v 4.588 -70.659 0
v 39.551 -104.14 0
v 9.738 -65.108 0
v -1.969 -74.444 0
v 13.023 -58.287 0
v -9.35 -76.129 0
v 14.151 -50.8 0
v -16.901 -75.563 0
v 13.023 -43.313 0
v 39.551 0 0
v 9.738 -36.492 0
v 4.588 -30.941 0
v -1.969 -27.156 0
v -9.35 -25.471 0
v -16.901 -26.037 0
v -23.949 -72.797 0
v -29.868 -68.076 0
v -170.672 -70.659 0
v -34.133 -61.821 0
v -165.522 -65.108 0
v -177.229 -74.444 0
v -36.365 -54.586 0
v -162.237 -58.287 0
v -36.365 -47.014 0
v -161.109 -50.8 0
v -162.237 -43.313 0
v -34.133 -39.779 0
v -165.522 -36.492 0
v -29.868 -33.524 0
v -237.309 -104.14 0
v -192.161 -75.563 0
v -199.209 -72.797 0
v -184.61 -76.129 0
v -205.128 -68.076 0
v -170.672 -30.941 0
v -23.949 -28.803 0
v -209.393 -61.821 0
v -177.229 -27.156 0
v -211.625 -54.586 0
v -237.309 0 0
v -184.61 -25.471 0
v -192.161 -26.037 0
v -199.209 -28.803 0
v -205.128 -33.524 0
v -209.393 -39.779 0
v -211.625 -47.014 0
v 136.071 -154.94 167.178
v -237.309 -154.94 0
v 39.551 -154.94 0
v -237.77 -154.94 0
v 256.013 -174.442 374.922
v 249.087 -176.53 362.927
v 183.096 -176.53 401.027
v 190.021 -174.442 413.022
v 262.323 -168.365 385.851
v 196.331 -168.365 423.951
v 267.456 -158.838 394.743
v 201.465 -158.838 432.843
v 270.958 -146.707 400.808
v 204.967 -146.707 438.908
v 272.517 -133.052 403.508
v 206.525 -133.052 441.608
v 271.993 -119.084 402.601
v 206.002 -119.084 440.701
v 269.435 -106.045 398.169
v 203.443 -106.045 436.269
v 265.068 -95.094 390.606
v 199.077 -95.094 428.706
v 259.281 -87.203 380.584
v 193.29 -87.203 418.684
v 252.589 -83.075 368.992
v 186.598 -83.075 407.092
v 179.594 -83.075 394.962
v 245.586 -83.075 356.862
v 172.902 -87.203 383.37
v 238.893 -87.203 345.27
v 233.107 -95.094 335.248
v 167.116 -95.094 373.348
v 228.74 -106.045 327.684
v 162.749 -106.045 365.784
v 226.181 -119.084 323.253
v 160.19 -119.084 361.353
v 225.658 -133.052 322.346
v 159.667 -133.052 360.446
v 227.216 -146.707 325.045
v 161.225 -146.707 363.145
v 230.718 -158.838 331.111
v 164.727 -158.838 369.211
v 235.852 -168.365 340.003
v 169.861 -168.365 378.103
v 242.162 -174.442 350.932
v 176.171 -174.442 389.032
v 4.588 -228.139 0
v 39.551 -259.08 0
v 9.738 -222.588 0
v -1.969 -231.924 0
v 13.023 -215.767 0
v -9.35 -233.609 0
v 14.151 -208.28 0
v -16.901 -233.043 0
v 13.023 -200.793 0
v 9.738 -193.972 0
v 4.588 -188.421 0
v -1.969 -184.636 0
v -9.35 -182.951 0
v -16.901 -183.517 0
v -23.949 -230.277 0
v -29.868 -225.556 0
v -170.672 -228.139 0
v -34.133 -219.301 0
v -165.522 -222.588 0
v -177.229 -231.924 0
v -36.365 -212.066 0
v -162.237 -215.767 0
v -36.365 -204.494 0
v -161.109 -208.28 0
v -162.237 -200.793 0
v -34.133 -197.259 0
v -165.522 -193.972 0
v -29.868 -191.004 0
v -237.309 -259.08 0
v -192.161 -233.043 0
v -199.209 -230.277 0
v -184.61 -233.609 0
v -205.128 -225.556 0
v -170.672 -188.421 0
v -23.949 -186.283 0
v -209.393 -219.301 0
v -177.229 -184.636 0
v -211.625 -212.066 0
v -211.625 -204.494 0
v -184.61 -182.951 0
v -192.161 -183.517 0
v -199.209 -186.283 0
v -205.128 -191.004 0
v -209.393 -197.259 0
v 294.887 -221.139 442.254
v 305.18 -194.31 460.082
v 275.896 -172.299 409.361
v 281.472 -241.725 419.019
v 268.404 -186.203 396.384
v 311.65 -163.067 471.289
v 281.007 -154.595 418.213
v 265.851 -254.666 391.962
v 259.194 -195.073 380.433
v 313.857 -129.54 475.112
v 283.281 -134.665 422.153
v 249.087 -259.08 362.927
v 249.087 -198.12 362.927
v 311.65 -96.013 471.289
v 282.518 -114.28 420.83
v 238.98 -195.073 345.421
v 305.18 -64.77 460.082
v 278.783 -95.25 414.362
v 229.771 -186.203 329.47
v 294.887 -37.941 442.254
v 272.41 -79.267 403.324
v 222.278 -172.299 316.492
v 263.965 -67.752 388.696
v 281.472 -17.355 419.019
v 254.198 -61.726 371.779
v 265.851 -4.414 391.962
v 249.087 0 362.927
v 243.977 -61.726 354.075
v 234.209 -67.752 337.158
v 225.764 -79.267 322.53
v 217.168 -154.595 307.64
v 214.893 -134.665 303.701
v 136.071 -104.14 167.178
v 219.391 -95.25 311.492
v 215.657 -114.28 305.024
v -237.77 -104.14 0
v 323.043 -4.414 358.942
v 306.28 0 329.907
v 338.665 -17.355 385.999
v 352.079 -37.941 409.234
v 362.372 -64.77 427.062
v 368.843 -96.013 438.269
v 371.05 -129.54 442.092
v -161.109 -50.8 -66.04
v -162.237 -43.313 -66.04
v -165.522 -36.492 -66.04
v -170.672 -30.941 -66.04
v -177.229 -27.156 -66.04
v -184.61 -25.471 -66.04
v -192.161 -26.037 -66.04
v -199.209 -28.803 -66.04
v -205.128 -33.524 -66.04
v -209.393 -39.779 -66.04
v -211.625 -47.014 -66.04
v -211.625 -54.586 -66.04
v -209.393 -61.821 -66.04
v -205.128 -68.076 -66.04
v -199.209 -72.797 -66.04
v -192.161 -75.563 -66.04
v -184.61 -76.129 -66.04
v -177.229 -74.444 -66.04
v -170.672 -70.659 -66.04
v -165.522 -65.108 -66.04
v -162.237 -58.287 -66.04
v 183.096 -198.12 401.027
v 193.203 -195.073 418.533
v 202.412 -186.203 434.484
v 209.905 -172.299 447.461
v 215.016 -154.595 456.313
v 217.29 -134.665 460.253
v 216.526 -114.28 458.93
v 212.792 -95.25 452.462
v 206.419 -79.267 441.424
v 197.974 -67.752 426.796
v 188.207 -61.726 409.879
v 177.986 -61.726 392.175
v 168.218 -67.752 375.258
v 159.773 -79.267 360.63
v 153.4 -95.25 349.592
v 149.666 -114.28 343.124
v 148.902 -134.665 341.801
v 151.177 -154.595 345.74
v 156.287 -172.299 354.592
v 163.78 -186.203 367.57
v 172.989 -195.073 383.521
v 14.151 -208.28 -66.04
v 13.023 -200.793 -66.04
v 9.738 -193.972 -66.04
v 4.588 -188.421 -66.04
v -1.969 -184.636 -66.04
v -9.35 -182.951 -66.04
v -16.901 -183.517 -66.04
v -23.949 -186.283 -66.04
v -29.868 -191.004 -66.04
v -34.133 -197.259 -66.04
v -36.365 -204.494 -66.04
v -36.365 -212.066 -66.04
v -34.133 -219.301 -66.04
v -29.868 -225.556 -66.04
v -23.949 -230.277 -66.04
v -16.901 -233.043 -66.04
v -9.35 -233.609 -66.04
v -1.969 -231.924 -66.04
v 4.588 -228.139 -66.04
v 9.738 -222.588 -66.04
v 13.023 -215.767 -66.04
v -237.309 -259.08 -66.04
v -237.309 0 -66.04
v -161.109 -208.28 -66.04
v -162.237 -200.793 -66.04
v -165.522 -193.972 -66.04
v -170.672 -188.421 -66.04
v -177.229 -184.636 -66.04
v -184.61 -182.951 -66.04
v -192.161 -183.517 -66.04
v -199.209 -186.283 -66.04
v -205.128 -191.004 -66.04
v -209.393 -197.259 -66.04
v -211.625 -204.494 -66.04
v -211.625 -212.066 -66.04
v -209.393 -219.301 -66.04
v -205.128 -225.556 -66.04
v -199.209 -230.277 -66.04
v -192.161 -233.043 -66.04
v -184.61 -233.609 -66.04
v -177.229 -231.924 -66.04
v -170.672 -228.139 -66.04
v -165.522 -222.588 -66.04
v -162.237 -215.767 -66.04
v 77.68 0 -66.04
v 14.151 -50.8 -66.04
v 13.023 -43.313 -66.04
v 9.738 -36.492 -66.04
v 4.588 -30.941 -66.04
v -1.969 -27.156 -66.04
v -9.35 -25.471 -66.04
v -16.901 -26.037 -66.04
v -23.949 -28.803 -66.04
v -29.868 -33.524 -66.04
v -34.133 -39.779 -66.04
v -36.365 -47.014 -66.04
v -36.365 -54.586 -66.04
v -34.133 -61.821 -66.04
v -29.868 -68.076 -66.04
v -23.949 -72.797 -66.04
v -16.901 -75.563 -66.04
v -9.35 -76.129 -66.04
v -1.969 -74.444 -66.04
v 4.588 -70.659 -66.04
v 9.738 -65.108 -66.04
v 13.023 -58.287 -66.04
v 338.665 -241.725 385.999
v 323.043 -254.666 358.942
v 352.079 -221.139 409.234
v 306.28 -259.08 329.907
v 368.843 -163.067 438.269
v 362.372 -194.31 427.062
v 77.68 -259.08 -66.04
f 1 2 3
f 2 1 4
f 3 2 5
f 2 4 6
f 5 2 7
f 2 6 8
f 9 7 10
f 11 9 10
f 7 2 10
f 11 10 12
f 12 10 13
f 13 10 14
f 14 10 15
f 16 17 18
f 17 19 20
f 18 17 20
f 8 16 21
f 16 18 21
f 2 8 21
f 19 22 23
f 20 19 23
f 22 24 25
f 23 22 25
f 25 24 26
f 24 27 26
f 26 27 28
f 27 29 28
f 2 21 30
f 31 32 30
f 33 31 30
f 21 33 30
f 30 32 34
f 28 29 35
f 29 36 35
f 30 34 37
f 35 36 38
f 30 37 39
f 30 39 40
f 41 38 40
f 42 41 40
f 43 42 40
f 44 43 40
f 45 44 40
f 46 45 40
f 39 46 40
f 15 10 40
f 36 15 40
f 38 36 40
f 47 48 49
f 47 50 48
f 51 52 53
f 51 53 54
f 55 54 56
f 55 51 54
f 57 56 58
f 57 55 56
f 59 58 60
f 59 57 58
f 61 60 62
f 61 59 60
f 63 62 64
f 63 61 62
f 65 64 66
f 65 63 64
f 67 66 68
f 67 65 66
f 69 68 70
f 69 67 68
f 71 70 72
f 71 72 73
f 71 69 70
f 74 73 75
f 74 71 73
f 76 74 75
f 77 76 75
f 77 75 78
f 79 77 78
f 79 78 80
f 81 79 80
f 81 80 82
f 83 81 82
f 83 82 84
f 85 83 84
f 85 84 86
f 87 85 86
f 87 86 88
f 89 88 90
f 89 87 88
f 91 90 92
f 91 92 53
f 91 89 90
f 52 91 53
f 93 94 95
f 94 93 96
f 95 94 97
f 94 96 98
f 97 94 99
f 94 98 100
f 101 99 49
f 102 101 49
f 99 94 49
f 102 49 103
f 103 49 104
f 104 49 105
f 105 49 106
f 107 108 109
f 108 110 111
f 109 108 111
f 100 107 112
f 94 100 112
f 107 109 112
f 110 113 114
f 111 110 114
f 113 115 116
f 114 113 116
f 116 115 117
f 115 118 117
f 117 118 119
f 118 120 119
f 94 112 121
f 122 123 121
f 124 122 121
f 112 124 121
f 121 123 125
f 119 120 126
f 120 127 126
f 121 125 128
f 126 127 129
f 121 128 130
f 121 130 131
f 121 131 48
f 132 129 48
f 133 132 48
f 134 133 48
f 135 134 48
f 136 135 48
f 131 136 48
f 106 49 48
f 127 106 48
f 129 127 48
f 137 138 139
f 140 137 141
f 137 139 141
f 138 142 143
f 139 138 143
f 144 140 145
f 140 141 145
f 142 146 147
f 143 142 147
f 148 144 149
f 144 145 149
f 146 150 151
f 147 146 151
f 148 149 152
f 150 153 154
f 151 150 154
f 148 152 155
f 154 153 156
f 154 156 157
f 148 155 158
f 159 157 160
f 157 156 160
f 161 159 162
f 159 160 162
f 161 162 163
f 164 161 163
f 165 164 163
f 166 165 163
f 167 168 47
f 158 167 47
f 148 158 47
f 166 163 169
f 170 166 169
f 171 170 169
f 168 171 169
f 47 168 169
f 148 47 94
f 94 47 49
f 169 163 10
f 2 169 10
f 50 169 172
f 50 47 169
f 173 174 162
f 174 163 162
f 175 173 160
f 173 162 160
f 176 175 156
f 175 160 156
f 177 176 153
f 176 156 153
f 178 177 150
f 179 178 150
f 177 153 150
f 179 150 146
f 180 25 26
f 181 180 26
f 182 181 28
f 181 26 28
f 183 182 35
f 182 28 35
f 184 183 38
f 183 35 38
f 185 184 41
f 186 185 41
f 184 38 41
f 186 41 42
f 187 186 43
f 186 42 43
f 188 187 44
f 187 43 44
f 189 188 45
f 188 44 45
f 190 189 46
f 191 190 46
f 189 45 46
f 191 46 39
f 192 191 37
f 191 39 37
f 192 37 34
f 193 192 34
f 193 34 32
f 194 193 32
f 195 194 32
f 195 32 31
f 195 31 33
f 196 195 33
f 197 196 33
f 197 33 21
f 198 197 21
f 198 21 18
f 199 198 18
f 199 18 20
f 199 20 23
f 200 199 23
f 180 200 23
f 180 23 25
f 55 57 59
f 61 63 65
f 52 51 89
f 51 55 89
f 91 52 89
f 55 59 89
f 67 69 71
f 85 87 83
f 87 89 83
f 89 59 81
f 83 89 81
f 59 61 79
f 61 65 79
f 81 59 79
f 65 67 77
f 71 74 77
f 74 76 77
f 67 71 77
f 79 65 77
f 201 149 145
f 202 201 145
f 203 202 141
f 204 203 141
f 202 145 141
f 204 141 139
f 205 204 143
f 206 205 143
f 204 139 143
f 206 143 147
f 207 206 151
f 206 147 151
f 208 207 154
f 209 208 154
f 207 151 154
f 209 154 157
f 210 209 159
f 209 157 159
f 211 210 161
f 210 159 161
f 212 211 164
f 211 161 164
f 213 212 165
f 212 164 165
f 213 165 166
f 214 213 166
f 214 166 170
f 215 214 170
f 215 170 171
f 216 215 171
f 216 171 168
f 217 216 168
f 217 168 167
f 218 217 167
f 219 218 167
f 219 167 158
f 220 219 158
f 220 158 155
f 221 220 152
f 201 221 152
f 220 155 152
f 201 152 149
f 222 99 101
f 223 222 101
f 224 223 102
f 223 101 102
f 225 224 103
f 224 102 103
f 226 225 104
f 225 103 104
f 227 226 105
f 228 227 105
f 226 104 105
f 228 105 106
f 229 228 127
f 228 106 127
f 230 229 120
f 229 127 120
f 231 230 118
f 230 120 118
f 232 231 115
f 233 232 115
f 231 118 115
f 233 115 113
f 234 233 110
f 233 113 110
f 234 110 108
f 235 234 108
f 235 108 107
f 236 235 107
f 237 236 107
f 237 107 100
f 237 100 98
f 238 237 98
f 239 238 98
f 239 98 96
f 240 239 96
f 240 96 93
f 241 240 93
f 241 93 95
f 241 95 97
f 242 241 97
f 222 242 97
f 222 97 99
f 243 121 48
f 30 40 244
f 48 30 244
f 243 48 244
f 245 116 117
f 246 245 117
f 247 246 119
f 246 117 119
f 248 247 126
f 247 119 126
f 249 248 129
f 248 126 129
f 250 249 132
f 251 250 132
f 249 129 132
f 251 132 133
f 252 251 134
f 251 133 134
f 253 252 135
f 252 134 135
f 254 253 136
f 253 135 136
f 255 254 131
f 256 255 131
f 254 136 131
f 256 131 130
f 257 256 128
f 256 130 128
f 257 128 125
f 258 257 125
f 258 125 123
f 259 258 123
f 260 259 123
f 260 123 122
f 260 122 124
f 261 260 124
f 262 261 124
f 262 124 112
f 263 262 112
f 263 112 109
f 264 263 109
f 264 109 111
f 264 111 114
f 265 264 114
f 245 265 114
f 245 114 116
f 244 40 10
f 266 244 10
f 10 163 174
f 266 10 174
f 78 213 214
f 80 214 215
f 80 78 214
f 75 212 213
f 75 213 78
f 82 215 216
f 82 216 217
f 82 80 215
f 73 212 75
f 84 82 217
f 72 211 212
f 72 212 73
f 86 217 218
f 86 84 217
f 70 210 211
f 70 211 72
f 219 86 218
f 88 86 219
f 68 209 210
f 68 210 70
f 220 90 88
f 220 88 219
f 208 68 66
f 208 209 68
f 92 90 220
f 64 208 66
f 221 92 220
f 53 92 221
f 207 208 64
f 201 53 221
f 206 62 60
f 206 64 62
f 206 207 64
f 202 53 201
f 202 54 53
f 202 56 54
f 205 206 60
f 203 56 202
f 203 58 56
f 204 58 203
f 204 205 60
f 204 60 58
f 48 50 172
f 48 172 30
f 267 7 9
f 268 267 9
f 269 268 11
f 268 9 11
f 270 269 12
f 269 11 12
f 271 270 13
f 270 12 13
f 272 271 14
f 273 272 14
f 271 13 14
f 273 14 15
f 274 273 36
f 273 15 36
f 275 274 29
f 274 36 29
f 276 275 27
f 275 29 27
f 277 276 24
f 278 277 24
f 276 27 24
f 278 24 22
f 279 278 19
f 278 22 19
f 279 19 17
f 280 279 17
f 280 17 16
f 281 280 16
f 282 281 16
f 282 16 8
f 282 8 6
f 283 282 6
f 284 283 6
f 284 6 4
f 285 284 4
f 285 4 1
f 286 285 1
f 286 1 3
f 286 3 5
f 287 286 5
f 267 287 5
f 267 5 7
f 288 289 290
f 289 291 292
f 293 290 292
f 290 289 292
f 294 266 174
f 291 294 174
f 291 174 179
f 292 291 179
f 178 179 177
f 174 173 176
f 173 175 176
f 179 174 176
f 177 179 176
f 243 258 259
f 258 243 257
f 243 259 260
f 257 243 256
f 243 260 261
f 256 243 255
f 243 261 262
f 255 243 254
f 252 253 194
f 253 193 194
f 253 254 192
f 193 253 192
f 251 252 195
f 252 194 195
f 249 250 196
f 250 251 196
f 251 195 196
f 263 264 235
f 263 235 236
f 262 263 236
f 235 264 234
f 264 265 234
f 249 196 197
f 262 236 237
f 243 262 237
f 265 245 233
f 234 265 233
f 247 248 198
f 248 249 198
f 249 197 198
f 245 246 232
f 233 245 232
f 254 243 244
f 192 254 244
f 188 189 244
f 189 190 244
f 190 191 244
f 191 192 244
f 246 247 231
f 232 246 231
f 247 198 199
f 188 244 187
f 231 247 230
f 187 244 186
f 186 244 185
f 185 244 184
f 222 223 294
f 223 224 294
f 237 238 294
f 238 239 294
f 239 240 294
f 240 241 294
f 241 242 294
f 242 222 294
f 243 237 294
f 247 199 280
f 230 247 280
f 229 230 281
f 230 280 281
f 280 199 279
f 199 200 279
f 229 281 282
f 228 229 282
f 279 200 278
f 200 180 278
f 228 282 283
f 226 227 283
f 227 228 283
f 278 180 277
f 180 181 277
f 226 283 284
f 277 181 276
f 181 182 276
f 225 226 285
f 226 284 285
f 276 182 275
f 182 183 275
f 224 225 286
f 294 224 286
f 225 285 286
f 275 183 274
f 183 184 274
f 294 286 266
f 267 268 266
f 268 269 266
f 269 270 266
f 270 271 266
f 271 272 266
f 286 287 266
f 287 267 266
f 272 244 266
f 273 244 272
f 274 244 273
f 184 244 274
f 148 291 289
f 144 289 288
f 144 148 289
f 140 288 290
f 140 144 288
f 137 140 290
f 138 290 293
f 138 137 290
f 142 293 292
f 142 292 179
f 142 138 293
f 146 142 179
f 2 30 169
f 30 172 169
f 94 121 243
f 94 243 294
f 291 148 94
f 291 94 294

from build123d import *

# Parameters (mm, degrees)
F1_DEPTH = 259.08
F2_R     = 68.58
F2_R_2   = 46.99
F3_DEPTH = 76.2
F4_R     = 129.53999
F7_DEPTH = 25.4
F8_R     = 25.4
F9_DEPTH = 76.2


# Not quite as in the source:
# - a fillet or chamfer is up to 0.001 mm smaller than in the source, because OpenCascade refuses the exact size


with BuildPart() as f1:
    # F0 (on Front) → F1 (new body)
    with BuildSketch(Plane.XZ):
        Polygon((39.5514294499, 0), (-237.3085705501, 0), (-237.3085705501, -66.04), (77.6796412272, -66.04), (371.0496412272, 442.0917454165), (313.8573235613, 475.1117454165), align=None)
    extrude(amount=F1_DEPTH)

    # F2 (on face) → F3 (join)
    with BuildSketch(Plane(origin=(29.6635720874, 0, -17.1262713298), x_dir=(0, -1, 0), z_dir=(-0.8660254038, 0, 0.5))):
        with Locations((129.54, 438.8475029477)):
            Circle(F2_R)
        with Locations((129.54, 438.8475029477)):
            Circle(F2_R_2, mode=Mode.SUBTRACT)
    extrude(amount=F3_DEPTH)

    # F4 (radius 129.54 in the source; OpenCascade refuses exactly that, so slightly less here)
    f4_edges = [f1.edges().sort_by_distance(p)[0] for p in [
        (342.453482, -259.08, 458.601745),
        (342.453482, 0, 458.601745),
    ]]
    fillet(f4_edges, radius=F4_R)

    # F6 (on offset) → F7 (join, symmetric)
    with BuildSketch(Plane.XZ.offset(129.54)):
        Polygon((136.0714294499, 167.1775439465), (-237.7703315524, 0), (39.5514294499, 0), align=None)
    extrude(amount=F7_DEPTH, both=True)

    # F8 (on face) → F9 (cut)
    with BuildSketch(Plane.XY):
        with Locations((-186.5085705501, -50.8)):
            Circle(F8_R)
        with Locations((-186.5085705501, -208.28)):
            Circle(F8_R)
        with Locations((-11.2485705501, -50.8)):
            Circle(F8_R)
        with Locations((-11.2485705501, -208.28)):
            Circle(F8_R)
    extrude(amount=-F9_DEPTH, mode=Mode.SUBTRACT)


solid = f1.part
